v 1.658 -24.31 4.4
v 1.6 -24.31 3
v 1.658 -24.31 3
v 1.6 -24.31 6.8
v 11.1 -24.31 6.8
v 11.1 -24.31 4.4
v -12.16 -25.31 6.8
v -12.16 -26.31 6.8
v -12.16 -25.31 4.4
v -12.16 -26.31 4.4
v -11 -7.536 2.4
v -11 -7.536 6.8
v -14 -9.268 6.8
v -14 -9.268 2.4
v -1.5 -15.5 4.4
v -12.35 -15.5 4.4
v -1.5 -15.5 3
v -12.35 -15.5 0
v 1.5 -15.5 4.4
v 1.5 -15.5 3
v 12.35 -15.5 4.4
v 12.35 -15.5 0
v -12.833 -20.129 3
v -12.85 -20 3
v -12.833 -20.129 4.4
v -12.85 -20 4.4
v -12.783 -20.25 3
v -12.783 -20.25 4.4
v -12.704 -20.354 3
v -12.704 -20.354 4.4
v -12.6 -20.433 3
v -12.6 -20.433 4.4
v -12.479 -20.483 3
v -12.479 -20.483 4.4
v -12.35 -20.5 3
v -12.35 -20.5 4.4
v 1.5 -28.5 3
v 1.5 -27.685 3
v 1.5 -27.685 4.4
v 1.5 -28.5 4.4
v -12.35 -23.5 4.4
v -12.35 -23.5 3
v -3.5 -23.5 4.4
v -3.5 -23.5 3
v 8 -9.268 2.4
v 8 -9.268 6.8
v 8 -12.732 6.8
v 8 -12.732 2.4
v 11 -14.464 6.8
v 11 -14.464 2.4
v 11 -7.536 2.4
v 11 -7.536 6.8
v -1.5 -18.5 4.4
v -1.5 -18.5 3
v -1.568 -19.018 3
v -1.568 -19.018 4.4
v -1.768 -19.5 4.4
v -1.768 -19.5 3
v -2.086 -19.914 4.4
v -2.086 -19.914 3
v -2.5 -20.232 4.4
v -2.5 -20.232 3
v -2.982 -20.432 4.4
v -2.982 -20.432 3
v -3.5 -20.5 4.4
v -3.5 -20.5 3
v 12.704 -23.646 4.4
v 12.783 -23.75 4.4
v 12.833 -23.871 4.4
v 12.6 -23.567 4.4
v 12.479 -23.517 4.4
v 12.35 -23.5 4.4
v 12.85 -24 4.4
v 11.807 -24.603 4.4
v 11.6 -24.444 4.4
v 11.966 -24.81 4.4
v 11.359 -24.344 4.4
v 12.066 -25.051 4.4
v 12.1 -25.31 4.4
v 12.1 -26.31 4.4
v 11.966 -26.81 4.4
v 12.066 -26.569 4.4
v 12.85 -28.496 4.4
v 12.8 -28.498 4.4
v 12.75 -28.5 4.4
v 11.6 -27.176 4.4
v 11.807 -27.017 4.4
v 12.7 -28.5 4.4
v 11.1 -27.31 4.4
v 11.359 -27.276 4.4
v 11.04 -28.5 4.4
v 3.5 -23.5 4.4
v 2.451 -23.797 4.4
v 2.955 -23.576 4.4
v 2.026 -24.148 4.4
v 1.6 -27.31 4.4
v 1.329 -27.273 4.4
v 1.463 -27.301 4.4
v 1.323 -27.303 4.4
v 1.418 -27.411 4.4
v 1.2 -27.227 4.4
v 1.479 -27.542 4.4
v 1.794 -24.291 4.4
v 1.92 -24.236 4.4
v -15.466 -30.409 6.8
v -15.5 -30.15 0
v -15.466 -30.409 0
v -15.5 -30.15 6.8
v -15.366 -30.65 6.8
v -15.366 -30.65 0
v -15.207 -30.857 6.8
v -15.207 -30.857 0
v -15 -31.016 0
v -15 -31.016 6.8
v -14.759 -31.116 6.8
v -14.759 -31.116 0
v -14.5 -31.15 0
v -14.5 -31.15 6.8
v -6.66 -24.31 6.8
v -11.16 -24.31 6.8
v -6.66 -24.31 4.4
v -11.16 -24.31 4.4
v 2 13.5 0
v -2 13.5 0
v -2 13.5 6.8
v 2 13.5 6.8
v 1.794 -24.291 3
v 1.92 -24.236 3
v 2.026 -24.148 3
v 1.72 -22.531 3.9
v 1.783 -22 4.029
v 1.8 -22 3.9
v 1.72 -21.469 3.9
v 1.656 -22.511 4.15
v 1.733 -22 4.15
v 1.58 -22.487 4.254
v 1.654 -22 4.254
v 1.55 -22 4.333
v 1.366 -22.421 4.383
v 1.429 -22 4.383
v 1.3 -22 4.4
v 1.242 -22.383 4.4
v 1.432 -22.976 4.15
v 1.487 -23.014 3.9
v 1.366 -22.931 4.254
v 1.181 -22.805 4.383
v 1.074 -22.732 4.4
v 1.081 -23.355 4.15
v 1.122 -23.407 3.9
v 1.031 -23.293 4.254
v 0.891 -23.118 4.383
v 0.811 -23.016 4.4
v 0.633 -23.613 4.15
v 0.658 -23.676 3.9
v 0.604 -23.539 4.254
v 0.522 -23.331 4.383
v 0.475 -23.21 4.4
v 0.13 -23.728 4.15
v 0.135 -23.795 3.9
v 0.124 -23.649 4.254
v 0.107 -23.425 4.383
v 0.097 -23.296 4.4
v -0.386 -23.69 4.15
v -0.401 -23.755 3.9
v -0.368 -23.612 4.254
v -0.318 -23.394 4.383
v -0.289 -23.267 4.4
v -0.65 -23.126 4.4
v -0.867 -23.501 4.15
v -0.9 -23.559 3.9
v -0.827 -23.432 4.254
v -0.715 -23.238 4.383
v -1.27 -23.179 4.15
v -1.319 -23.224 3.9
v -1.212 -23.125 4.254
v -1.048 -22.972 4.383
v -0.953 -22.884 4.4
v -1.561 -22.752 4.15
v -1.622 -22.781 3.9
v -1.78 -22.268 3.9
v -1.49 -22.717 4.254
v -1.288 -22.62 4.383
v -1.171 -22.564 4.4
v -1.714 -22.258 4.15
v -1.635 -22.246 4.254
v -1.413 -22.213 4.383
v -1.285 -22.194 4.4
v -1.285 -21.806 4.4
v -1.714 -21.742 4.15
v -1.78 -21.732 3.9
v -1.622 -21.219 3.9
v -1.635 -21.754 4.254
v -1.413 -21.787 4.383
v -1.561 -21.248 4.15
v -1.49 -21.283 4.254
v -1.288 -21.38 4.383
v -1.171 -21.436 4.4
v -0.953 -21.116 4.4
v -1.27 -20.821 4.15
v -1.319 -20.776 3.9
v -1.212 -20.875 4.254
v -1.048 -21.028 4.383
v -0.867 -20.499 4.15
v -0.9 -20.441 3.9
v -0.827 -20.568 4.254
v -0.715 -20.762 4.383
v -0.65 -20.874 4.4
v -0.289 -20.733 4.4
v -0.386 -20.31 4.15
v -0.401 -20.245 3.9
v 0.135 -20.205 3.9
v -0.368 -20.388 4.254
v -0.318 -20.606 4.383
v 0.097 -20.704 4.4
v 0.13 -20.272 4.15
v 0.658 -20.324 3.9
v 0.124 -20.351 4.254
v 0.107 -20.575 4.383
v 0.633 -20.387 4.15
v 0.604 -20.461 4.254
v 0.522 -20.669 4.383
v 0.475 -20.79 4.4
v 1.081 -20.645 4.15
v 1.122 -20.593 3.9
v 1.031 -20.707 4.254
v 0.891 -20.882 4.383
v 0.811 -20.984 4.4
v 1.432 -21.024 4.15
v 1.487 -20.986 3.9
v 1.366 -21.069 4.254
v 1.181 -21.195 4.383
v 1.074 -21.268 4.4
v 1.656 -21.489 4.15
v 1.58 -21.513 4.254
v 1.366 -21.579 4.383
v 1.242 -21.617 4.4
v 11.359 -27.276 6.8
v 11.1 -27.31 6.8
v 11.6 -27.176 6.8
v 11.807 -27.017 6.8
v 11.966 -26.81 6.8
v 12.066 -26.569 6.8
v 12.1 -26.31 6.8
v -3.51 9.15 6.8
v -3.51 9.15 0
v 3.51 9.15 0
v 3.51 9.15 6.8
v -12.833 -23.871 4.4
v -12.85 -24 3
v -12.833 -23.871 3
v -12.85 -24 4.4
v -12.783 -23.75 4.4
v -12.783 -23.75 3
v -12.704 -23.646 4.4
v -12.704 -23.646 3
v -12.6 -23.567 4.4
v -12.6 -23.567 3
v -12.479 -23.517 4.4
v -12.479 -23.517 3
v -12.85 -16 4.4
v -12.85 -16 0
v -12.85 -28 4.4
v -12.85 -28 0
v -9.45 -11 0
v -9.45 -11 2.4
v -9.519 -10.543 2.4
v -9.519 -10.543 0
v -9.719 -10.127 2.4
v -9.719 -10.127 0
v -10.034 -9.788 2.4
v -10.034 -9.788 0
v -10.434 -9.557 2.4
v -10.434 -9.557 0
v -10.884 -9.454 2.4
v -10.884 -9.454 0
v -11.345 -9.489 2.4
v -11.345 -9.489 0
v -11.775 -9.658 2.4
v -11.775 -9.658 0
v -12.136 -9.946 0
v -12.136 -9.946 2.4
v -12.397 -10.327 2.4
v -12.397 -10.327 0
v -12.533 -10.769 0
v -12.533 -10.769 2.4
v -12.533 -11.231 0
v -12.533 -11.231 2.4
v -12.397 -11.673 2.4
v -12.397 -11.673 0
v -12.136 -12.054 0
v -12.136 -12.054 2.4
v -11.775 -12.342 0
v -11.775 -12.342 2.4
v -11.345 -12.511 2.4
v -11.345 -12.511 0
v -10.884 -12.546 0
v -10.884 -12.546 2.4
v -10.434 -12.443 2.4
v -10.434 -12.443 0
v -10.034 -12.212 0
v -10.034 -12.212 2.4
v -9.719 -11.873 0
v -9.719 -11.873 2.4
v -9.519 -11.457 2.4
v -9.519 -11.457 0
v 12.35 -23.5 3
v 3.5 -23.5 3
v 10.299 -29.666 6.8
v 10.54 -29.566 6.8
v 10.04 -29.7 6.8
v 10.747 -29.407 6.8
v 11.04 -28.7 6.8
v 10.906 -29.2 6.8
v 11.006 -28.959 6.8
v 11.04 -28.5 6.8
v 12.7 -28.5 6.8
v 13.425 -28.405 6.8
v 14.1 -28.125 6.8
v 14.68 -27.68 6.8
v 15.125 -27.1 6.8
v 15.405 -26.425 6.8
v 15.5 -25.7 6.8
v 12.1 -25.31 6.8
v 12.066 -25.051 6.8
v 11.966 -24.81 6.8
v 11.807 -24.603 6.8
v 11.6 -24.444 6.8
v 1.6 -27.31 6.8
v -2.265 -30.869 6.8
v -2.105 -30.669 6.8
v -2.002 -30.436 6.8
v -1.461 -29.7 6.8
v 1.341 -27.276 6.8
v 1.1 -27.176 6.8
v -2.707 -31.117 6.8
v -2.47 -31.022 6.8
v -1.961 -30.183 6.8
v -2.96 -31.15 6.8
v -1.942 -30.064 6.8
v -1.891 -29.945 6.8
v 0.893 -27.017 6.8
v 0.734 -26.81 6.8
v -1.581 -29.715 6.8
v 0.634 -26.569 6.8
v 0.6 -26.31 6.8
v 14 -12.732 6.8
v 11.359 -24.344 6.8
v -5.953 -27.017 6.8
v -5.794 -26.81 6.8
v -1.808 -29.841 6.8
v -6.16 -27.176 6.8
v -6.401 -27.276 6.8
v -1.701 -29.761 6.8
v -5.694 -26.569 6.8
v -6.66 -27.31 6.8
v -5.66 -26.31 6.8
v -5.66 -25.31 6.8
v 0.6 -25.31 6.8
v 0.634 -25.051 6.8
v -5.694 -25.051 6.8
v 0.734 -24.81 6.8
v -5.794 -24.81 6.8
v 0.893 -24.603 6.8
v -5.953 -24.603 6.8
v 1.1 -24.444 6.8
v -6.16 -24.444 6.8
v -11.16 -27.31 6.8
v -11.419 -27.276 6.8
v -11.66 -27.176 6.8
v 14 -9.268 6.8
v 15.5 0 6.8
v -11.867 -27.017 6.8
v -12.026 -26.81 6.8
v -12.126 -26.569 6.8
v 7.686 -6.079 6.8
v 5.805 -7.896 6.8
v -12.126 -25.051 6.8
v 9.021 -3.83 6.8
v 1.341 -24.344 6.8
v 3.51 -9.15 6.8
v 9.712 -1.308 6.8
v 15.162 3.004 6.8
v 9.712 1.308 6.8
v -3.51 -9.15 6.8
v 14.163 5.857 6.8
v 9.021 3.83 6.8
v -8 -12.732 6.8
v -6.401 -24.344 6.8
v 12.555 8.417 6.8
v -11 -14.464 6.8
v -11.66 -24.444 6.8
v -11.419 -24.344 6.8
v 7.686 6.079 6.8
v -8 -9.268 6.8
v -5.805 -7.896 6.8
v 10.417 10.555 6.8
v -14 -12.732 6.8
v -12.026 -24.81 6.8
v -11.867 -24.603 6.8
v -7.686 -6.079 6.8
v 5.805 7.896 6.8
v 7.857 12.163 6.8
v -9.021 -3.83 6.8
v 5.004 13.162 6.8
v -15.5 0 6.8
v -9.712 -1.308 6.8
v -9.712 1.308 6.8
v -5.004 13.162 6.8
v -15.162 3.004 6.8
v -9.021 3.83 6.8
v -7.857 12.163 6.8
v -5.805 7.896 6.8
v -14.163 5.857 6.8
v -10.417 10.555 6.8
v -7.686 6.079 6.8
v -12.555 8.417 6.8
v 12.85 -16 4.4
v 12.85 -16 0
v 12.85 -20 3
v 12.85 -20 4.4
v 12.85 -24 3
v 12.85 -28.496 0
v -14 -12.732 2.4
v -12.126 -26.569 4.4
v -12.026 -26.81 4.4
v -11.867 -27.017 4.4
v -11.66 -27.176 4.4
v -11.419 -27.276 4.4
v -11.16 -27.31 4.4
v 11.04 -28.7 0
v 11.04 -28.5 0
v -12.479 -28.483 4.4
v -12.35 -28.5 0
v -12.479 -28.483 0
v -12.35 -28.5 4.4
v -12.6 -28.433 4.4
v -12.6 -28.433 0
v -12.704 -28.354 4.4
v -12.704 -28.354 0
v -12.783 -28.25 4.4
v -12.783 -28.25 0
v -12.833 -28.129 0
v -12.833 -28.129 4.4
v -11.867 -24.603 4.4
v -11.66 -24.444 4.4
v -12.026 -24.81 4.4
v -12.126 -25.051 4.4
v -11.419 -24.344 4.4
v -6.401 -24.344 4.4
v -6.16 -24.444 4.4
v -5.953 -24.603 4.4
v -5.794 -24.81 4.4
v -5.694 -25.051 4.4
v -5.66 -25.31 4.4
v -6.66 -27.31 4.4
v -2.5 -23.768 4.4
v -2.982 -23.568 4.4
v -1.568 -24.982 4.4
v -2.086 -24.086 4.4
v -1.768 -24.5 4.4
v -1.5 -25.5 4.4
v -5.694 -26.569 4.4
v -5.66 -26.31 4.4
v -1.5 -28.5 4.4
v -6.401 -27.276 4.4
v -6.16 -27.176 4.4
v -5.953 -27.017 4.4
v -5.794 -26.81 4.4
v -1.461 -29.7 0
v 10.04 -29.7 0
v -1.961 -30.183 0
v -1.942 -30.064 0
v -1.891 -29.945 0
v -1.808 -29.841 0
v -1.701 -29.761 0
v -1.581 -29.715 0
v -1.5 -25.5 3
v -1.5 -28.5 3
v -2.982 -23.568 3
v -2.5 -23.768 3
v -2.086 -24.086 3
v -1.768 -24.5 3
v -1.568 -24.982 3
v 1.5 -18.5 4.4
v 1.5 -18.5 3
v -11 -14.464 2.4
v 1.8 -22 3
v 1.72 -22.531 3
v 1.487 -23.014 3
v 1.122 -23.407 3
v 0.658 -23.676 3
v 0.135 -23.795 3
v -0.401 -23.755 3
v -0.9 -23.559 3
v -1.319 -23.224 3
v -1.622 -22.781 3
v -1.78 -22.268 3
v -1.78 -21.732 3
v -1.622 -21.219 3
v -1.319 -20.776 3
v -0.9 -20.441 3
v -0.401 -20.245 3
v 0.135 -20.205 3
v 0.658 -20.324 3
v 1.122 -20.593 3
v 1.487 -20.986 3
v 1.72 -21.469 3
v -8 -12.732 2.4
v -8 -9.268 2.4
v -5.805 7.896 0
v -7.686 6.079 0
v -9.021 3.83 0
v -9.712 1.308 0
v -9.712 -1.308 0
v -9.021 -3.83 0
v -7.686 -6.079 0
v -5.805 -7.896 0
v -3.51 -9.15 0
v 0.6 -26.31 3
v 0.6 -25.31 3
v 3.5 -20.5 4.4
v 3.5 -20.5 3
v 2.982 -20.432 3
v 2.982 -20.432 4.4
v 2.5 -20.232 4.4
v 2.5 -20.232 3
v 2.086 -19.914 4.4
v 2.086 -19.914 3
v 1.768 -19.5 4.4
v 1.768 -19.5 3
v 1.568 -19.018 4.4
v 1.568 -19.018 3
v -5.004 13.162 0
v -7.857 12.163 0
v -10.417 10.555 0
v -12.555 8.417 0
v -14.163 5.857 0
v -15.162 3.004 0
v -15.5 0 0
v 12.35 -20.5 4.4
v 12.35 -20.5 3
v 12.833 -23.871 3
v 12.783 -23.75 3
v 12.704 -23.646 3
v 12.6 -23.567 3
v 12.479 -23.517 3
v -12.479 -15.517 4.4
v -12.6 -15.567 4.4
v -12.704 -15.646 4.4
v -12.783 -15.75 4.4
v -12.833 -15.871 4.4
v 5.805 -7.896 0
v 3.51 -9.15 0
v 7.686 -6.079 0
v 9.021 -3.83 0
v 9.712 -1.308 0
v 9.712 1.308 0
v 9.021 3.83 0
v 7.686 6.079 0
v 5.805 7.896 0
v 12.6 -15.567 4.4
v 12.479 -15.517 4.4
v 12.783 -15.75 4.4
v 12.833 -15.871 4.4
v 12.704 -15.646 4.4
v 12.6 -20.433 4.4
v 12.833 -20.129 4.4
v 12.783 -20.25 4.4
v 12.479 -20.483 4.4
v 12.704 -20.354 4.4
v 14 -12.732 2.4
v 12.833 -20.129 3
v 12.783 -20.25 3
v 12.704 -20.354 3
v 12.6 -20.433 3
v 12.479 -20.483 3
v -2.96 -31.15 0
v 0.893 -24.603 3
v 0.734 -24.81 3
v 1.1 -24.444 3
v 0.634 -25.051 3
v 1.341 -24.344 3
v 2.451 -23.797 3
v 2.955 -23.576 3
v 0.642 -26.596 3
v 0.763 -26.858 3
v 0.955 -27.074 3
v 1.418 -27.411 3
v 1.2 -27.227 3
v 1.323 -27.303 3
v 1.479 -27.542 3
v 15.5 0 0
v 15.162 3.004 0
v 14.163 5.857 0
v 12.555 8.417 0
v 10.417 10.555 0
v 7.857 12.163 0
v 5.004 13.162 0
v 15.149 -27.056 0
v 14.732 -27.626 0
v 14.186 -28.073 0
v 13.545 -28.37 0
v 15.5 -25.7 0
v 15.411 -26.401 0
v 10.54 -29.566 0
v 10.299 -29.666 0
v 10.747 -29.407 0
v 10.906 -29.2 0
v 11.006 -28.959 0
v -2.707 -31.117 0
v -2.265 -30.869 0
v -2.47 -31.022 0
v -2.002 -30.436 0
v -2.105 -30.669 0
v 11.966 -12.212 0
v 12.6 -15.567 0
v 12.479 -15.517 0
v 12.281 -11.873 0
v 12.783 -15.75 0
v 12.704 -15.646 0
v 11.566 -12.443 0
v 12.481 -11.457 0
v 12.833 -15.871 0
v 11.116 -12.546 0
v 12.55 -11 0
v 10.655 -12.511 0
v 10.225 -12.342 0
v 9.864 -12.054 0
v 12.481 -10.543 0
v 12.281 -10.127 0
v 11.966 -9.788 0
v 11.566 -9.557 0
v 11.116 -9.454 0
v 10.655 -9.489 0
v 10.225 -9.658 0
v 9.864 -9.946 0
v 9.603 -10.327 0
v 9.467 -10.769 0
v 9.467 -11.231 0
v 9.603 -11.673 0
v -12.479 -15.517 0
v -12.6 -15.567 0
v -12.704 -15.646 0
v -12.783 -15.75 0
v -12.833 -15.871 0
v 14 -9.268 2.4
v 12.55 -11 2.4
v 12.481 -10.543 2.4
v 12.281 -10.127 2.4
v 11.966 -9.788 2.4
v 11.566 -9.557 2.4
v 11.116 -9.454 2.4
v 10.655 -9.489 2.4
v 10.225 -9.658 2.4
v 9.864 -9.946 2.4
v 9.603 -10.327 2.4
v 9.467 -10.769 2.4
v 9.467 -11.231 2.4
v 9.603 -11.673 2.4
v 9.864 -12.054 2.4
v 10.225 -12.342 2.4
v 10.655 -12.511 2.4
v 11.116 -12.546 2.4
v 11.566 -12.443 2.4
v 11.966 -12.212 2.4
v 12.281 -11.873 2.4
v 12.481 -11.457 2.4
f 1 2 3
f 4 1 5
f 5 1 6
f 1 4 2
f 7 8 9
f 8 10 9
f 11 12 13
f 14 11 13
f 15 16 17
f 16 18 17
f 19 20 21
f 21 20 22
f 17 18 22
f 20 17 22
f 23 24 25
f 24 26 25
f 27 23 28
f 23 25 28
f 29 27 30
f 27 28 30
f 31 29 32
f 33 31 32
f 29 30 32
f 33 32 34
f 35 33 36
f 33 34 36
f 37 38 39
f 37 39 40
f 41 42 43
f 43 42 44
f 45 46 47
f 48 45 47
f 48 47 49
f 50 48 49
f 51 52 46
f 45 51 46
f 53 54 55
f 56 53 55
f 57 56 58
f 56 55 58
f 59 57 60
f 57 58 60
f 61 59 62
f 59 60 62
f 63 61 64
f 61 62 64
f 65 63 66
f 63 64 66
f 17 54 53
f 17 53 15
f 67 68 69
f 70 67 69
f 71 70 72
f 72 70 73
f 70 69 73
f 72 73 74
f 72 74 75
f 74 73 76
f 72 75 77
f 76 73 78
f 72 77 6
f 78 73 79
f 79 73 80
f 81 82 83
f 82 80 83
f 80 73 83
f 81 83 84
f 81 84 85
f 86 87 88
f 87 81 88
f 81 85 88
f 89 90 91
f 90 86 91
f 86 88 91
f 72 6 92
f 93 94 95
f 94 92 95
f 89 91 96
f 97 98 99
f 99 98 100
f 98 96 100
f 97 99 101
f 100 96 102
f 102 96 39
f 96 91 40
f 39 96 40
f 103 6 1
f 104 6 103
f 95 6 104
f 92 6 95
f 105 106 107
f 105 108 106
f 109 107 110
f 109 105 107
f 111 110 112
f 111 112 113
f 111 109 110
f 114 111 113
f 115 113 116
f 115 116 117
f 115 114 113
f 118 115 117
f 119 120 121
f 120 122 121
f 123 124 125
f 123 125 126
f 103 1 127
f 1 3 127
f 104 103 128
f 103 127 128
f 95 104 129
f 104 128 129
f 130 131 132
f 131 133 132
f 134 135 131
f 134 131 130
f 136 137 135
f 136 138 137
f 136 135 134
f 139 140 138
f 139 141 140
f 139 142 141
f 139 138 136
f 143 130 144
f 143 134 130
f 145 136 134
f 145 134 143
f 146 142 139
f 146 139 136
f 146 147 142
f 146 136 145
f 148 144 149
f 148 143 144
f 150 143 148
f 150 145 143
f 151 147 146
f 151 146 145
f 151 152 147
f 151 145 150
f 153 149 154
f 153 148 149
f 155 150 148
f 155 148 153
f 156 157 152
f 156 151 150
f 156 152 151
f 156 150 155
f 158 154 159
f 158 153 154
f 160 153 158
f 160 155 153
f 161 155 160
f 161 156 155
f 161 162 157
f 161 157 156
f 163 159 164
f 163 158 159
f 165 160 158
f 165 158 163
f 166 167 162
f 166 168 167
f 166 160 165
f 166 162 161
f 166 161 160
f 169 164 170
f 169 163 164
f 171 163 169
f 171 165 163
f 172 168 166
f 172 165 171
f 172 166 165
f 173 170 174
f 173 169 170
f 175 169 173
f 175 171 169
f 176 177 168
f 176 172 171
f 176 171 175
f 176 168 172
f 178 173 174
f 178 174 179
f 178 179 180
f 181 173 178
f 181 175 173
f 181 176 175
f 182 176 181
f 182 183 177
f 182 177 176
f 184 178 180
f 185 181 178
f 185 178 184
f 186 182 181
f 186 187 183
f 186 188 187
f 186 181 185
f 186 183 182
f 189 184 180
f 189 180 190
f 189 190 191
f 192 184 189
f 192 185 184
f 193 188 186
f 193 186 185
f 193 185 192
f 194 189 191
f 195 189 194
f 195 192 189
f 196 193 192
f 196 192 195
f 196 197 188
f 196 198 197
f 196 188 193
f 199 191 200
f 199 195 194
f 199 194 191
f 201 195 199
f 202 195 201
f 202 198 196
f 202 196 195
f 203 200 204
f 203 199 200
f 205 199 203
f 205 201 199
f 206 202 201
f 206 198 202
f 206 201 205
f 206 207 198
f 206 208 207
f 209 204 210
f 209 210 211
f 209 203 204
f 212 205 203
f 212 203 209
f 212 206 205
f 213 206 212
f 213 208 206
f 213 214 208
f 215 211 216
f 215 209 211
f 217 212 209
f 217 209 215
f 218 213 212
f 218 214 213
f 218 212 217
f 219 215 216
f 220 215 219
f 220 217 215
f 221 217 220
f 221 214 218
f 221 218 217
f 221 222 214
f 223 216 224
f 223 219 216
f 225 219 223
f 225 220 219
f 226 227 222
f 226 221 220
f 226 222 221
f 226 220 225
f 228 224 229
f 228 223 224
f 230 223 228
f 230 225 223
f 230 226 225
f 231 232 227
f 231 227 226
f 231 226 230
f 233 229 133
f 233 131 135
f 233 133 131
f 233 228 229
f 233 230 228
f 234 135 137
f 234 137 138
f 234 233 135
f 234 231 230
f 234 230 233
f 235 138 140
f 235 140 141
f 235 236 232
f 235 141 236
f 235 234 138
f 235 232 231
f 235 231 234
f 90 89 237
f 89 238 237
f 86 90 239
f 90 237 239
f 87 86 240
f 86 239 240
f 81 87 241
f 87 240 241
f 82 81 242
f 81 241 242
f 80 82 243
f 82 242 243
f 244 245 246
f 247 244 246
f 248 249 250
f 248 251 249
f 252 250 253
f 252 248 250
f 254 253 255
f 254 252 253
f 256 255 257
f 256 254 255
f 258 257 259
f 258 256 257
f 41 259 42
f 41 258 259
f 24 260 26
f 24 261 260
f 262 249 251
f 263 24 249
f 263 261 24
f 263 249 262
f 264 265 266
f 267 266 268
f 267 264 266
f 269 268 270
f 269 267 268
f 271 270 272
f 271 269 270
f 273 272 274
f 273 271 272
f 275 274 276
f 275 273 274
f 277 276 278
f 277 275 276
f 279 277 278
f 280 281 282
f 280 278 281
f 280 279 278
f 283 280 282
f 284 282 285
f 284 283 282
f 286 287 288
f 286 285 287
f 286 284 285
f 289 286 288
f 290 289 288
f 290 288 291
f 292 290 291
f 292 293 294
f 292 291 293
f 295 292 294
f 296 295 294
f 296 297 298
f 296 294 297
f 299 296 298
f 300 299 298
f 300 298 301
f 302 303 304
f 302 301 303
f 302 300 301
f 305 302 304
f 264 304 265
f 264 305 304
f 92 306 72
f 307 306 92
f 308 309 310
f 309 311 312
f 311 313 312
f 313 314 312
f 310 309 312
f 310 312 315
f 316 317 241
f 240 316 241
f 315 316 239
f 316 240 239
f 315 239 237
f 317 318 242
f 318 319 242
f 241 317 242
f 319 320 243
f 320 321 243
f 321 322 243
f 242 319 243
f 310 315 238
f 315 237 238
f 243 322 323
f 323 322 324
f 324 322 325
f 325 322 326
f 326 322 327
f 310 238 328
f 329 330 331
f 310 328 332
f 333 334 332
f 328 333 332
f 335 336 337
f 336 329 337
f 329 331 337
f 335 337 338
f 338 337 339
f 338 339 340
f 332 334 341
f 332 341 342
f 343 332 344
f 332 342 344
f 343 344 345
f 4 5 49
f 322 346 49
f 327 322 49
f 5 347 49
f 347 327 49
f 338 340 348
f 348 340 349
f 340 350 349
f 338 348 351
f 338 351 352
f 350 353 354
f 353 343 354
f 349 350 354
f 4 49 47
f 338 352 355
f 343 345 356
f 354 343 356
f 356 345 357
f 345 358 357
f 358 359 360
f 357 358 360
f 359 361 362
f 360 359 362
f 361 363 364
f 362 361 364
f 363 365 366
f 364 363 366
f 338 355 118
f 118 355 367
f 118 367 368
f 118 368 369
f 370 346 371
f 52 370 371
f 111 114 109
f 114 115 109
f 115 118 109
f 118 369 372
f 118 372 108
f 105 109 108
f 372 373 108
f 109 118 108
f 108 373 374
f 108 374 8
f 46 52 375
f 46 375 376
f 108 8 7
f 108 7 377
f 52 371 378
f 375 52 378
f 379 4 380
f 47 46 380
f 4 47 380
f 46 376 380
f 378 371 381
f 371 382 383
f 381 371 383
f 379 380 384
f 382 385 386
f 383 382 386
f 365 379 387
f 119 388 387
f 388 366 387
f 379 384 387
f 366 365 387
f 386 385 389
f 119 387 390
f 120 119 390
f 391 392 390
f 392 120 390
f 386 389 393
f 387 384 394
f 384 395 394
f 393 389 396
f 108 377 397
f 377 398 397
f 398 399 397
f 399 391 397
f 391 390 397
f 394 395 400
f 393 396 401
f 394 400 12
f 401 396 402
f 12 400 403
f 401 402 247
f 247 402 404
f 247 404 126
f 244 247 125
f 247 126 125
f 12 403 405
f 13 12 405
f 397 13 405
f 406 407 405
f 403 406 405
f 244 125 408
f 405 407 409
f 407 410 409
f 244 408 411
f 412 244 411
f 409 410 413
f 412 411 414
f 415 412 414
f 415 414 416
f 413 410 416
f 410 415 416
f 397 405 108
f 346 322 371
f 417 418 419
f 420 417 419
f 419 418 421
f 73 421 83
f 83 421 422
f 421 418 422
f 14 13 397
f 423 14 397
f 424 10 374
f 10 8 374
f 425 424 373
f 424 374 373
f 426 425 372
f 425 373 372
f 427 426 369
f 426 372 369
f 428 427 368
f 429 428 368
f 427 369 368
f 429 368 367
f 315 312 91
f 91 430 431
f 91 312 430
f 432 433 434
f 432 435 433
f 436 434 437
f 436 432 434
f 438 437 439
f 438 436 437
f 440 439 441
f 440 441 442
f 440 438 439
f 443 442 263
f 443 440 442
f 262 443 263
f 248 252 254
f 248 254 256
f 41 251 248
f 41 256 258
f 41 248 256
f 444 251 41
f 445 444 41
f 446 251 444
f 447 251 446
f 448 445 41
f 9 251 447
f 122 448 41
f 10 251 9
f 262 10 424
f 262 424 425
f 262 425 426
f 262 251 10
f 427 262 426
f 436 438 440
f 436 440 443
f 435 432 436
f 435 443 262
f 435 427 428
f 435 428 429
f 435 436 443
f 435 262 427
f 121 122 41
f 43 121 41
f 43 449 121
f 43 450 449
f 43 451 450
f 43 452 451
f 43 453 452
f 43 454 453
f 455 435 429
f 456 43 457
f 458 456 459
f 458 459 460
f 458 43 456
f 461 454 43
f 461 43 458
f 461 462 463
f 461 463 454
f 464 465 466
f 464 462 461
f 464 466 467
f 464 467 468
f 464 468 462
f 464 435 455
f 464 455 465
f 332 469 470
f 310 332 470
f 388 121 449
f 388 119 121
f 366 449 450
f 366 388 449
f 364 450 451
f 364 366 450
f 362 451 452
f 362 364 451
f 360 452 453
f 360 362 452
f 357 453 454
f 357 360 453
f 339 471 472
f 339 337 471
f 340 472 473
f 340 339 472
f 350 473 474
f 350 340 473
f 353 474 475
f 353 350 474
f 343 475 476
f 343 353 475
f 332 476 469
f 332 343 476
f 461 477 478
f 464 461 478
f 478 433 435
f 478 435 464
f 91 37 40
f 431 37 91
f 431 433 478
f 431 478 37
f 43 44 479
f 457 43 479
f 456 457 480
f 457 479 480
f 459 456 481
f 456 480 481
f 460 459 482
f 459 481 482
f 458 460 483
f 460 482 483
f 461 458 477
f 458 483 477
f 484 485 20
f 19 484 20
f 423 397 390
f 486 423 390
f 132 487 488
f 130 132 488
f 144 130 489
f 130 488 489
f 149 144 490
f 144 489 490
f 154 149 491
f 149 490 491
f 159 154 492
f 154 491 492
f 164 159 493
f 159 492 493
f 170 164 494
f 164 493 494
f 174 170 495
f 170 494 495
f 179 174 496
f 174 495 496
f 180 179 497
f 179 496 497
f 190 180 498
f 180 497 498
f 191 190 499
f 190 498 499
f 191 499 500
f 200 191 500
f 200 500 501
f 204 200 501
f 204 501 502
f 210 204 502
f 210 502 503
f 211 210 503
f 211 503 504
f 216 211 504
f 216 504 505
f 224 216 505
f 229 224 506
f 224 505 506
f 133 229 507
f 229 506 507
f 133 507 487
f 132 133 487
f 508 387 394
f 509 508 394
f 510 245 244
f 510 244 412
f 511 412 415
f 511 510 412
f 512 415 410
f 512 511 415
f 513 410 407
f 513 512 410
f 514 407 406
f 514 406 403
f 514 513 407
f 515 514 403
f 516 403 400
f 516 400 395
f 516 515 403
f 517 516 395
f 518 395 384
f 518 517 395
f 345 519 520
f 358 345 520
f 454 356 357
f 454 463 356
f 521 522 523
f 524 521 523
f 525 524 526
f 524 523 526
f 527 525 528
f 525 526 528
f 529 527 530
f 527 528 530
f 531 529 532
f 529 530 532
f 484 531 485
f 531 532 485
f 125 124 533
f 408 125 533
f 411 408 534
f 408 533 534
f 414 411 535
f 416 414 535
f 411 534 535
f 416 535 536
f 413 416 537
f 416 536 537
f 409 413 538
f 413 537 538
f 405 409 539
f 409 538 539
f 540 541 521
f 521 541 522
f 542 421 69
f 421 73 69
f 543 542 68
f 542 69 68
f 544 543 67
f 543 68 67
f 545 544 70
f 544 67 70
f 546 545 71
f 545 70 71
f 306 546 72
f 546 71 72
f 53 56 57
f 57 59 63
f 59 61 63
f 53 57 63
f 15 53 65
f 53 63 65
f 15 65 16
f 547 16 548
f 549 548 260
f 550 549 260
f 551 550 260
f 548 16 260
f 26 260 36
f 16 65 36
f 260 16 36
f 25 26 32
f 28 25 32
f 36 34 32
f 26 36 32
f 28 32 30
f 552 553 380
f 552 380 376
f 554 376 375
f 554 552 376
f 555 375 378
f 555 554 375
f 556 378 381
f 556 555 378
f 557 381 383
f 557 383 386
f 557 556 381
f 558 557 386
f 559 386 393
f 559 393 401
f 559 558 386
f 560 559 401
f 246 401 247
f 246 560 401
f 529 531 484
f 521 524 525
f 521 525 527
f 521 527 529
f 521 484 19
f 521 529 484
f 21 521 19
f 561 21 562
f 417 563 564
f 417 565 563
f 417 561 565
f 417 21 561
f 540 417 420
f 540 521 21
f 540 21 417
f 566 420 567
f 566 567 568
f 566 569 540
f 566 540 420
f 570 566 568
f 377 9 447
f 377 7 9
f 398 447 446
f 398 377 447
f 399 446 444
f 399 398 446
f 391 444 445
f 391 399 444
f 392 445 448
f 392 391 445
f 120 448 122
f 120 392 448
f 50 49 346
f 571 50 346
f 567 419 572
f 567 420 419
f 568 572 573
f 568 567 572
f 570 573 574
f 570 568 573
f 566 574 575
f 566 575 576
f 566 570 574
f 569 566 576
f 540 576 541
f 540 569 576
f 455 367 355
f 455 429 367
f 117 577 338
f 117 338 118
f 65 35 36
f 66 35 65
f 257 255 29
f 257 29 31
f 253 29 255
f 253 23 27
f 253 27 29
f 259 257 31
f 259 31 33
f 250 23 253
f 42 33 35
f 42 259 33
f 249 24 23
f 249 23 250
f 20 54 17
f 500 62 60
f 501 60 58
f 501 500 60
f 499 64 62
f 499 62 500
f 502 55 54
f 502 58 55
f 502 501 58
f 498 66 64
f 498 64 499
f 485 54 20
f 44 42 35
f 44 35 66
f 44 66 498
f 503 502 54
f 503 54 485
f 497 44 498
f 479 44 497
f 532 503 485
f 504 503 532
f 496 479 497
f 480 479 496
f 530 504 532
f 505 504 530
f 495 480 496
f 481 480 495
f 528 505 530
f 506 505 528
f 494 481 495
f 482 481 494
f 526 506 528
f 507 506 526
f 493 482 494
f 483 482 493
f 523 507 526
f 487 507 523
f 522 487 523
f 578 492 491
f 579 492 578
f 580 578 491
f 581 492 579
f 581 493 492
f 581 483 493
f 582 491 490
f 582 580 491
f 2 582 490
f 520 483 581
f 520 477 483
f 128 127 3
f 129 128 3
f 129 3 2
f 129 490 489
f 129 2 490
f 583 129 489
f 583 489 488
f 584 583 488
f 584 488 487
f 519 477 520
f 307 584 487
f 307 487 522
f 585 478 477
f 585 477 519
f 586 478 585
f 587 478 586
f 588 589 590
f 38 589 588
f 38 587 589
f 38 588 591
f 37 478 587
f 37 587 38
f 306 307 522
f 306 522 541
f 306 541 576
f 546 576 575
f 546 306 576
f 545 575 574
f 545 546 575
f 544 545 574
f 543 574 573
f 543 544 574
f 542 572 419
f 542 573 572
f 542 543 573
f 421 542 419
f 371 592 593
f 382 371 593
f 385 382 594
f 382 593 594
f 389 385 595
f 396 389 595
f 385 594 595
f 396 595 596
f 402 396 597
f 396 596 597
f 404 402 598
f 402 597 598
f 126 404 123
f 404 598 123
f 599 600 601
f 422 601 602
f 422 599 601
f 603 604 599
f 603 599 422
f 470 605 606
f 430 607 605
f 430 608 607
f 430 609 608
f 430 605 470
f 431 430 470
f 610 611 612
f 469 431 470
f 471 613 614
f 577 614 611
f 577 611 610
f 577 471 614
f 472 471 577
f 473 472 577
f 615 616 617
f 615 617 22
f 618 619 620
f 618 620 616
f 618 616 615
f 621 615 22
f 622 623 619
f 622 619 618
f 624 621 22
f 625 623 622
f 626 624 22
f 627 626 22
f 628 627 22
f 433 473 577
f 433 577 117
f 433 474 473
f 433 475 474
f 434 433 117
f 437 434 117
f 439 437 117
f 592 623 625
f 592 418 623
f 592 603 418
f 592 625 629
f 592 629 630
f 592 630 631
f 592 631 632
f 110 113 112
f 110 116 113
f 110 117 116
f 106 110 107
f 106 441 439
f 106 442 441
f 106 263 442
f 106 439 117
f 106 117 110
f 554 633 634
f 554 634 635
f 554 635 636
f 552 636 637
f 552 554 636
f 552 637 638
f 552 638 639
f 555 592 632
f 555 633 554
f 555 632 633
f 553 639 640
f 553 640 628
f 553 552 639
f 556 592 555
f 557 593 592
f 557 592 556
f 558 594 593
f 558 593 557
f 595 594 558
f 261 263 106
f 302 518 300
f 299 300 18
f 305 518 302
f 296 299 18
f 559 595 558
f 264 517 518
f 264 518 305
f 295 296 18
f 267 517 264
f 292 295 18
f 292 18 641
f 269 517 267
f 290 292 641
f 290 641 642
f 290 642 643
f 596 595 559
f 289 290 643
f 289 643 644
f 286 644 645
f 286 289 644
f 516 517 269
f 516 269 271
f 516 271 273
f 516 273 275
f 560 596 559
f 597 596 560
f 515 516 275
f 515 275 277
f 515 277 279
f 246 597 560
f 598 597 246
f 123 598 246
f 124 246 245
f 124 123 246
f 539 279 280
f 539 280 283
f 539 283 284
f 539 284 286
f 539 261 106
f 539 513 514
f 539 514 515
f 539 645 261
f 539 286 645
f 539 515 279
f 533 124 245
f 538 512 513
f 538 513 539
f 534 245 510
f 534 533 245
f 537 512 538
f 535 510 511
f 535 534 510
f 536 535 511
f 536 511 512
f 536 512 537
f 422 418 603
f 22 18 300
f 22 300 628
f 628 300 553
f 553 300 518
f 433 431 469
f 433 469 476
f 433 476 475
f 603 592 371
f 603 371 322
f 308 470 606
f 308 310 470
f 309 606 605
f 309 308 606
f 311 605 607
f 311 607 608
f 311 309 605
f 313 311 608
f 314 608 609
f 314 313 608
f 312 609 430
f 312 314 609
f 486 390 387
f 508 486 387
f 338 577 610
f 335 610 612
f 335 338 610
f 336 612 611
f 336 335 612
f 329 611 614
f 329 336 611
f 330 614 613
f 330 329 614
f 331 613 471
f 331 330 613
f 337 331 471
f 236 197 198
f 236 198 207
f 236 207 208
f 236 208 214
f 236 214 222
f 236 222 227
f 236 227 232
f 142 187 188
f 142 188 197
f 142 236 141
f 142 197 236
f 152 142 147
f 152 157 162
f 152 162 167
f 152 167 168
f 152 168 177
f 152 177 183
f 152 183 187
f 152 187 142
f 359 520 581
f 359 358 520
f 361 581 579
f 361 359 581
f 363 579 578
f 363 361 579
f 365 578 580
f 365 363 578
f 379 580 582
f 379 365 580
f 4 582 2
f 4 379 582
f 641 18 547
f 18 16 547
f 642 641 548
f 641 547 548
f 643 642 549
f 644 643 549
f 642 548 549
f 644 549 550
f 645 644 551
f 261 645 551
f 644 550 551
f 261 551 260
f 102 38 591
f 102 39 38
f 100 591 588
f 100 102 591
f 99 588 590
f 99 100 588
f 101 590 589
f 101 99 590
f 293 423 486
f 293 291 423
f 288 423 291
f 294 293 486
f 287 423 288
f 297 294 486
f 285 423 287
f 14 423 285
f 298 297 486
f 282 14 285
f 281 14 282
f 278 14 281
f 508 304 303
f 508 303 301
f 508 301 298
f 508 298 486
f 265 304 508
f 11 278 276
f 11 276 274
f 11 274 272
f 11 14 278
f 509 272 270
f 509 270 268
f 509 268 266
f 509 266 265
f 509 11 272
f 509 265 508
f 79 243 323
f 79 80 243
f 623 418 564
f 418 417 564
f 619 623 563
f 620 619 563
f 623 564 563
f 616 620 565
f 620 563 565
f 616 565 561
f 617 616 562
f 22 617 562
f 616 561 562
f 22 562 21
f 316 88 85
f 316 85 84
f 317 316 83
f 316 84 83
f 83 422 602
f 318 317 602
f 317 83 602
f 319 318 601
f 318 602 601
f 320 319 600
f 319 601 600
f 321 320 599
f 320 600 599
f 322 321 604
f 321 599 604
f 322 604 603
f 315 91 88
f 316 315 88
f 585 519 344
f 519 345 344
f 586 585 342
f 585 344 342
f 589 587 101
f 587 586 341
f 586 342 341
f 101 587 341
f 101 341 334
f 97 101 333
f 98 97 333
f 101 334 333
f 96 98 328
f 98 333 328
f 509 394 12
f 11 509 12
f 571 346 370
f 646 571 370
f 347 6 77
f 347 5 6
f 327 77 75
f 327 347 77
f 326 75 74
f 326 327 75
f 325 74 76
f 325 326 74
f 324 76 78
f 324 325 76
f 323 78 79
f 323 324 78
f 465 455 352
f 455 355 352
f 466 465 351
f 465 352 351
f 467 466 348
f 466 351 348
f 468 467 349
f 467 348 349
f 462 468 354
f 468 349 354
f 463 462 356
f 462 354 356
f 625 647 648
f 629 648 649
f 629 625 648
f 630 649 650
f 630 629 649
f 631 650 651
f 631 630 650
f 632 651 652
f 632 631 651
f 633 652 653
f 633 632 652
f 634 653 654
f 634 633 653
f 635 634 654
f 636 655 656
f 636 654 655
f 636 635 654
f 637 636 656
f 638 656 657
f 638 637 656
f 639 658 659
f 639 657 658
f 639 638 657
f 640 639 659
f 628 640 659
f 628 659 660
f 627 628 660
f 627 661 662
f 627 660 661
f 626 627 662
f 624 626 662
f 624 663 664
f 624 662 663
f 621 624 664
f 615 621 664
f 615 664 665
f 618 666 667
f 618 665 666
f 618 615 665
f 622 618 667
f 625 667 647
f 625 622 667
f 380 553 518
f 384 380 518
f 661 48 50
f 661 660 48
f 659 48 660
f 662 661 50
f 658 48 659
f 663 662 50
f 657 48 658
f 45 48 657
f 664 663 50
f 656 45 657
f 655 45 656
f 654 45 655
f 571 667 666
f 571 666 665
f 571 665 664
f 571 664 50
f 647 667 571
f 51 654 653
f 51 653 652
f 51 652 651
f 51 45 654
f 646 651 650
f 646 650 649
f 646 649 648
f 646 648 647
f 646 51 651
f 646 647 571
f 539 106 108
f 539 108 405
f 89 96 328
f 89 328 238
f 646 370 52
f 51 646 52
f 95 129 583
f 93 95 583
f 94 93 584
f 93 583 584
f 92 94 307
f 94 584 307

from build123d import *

# Parameters (mm, degrees)
SKETCH_R        = 1.55
SKETCH_W        = 6.5
SKETCH_H        = 3
SKETCH_W_2      = 11.5
PAD_DEPTH       = 6.8
SKETCH005_W     = 25.7
SKETCH005_H     = 13
POCKET_DEPTH    = 3
SKETCH006_R     = 1.8
POCKET001_DEPTH = 1.4
POCKET002_DEPTH = 4.4
FILLET_R        = 1
FILLET001_R     = 0.5


with BuildPart() as part:
    # Sketch → Pad (new body)
    with BuildSketch(Plane.XY):
        with BuildLine():
            Line((-2, 13.5), (2, 13.5))
            ThreePointArc((15.5, 0), (11.545942, 9.545942), (2, 13.5))
            Line((15.5, 0), (15.5, -25.7))
            ThreePointArc((12.7, -28.5), (14.679899, -27.679899), (15.5, -25.7))
            Line((11.04, -28.5), (12.7, -28.5))
            Line((11.04, -29.7), (11.04, -28.5))
            Line((-1.96, -29.7), (11.04, -29.7))
            Line((-1.96, -31.15), (-1.96, -29.7))
            Line((-1.96, -31.15), (-15.5, -31.15))
            Line((-15.5, -31.15), (-15.5, 0))
            ThreePointArc((-2, 13.5), (-11.545942, 9.545942), (-15.5, 0))
        make_face()
        with Locations((-11, -11)):
            Circle(SKETCH_R, mode=Mode.SUBTRACT)
        with Locations((11, -11)):
            Circle(SKETCH_R, mode=Mode.SUBTRACT)
        with BuildLine():
            ThreePointArc((-3.50963, 9.15), (-9.8, 0), (-3.50963, -9.15))
            Line((3.50963, -9.15), (-3.50963, -9.15))
            ThreePointArc((3.50963, -9.15), (9.8, 0), (3.50963, 9.15))
            Line((-3.50963, 9.15), (3.50963, 9.15))
        make_face(mode=Mode.SUBTRACT)
        with Locations((-8.91, -25.81)):
            Rectangle(SKETCH_W, SKETCH_H, mode=Mode.SUBTRACT)
        with Locations((6.35, -25.81)):
            Rectangle(SKETCH_W_2, SKETCH_H, mode=Mode.SUBTRACT)
    extrude(amount=PAD_DEPTH)

    # Sketch005 (on Face26 of Pad) → Pocket (cut)
    with BuildSketch(Plane(origin=(0, 0, 0), x_dir=(1, 0, 0), z_dir=(0, 0, -1))):
        with Locations((0, 22)):
            Rectangle(SKETCH005_W, SKETCH005_H)
    extrude(amount=-POCKET_DEPTH, mode=Mode.SUBTRACT)

    # Sketch006 (on Face32 of Pocket) → Pocket001 (cut)
    with BuildSketch(Plane(origin=(0, 0, 3), x_dir=(1, 0, 0), z_dir=(0, 0, -1))):
        with Locations((0, 22)):
            Circle(SKETCH006_R)
        with BuildLine():
            Line((-12.85, 20.5), (-3.5, 20.5))
            ThreePointArc((-1.5, 18.5), (-2.085786, 19.914214), (-3.5, 20.5))
            Line((-1.5, 18.5), (-1.5, 15.5))
            Line((-1.5, 15.5), (-12.85, 15.5))
            Line((-12.85, 15.5), (-12.85, 20.5))
        make_face()
        with BuildLine():
            Line((1.5, 15.5), (12.85, 15.5))
            Line((12.85, 15.5), (12.85, 20.5))
            Line((12.85, 20.5), (3.5, 20.5))
            ThreePointArc((3.5, 20.5), (2.085786, 19.914214), (1.5, 18.5))
            Line((1.5, 18.5), (1.5, 15.5))
        make_face()
        with BuildLine():
            Line((-12.85, 23.5), (-3.5, 23.5))
            ThreePointArc((-3.5, 23.5), (-2.085786, 24.085786), (-1.5, 25.5))
            Line((-1.5, 25.5), (-1.5, 28.5))
            Line((-1.5, 28.5), (-12.85, 28.5))
            Line((-12.85, 28.5), (-12.85, 23.5))
        make_face()
        with BuildLine():
            Line((1.5, 28.5), (12.85, 28.5))
            Line((12.85, 28.5), (12.85, 23.5))
            Line((12.85, 23.5), (3.5, 23.5))
            ThreePointArc((1.5, 25.5), (2.085786, 24.085786), (3.5, 23.5))
            Line((1.5, 25.5), (1.5, 28.5))
        make_face()
    extrude(amount=-POCKET001_DEPTH, mode=Mode.SUBTRACT)

    # Sketch001 (on Face5 of Pocket001) → Pocket002 (cut)
    with BuildSketch(Plane.XY.offset(6.8)):
        Polygon((-8, -12.732051), (-8, -9.267949), (-11, -7.535898), (-14, -9.267949), (-14, -12.732051), (-11, -14.464102), align=None)
        Polygon((14, -12.732051), (14, -9.267949), (11, -7.535898), (8, -9.267949), (8, -12.732051), (11, -14.464102), align=None)
    extrude(amount=-POCKET002_DEPTH, mode=Mode.SUBTRACT)

    # Fillet
    fillet_edges = [part.edges().sort_by_distance(p)[0] for p in [
        (-15.5, -31.15, 3.4),
        (-1.96, -31.15, 3.4),
        (11.04, -29.7, 3.4),
        (0.6, -24.31, 4.9),
        (-12.16, -24.31, 5.6),
        (-12.16, -27.31, 5.6),
        (0.6, -27.31, 4.9),
        (-5.66, -24.31, 5.6),
        (12.1, -24.31, 5.6),
        (-5.66, -27.31, 5.6),
        (12.1, -27.31, 5.6),
    ]]
    fillet(fillet_edges, radius=FILLET_R)

    # Fillet001
    fillet001_edges = [part.edges().sort_by_distance(p)[0] for p in [
        (12.85, -15.5, 1.5),
        (12.85, -15.5, 3.7),
        (12.85, -20.5, 3.7),
        (-12.85, -20.5, 3.7),
        (12.85, -23.5, 3.7),
        (-12.85, -23.5, 3.7),
        (-12.85, -15.5, 3.7),
        (-12.85, -15.5, 1.5),
        (-12.85, -28.5, 3.7),
        (-12.85, -28.5, 1.5),
        (1.5, -27.304987, 3.7),
        (-1.96, -29.7, 3.4),
        (-1.8, -22, 4.4),
        (1.892549, -24.31, 3.7),
    ]]
    fillet(fillet001_edges, radius=FILLET001_R)


solid = part.part
